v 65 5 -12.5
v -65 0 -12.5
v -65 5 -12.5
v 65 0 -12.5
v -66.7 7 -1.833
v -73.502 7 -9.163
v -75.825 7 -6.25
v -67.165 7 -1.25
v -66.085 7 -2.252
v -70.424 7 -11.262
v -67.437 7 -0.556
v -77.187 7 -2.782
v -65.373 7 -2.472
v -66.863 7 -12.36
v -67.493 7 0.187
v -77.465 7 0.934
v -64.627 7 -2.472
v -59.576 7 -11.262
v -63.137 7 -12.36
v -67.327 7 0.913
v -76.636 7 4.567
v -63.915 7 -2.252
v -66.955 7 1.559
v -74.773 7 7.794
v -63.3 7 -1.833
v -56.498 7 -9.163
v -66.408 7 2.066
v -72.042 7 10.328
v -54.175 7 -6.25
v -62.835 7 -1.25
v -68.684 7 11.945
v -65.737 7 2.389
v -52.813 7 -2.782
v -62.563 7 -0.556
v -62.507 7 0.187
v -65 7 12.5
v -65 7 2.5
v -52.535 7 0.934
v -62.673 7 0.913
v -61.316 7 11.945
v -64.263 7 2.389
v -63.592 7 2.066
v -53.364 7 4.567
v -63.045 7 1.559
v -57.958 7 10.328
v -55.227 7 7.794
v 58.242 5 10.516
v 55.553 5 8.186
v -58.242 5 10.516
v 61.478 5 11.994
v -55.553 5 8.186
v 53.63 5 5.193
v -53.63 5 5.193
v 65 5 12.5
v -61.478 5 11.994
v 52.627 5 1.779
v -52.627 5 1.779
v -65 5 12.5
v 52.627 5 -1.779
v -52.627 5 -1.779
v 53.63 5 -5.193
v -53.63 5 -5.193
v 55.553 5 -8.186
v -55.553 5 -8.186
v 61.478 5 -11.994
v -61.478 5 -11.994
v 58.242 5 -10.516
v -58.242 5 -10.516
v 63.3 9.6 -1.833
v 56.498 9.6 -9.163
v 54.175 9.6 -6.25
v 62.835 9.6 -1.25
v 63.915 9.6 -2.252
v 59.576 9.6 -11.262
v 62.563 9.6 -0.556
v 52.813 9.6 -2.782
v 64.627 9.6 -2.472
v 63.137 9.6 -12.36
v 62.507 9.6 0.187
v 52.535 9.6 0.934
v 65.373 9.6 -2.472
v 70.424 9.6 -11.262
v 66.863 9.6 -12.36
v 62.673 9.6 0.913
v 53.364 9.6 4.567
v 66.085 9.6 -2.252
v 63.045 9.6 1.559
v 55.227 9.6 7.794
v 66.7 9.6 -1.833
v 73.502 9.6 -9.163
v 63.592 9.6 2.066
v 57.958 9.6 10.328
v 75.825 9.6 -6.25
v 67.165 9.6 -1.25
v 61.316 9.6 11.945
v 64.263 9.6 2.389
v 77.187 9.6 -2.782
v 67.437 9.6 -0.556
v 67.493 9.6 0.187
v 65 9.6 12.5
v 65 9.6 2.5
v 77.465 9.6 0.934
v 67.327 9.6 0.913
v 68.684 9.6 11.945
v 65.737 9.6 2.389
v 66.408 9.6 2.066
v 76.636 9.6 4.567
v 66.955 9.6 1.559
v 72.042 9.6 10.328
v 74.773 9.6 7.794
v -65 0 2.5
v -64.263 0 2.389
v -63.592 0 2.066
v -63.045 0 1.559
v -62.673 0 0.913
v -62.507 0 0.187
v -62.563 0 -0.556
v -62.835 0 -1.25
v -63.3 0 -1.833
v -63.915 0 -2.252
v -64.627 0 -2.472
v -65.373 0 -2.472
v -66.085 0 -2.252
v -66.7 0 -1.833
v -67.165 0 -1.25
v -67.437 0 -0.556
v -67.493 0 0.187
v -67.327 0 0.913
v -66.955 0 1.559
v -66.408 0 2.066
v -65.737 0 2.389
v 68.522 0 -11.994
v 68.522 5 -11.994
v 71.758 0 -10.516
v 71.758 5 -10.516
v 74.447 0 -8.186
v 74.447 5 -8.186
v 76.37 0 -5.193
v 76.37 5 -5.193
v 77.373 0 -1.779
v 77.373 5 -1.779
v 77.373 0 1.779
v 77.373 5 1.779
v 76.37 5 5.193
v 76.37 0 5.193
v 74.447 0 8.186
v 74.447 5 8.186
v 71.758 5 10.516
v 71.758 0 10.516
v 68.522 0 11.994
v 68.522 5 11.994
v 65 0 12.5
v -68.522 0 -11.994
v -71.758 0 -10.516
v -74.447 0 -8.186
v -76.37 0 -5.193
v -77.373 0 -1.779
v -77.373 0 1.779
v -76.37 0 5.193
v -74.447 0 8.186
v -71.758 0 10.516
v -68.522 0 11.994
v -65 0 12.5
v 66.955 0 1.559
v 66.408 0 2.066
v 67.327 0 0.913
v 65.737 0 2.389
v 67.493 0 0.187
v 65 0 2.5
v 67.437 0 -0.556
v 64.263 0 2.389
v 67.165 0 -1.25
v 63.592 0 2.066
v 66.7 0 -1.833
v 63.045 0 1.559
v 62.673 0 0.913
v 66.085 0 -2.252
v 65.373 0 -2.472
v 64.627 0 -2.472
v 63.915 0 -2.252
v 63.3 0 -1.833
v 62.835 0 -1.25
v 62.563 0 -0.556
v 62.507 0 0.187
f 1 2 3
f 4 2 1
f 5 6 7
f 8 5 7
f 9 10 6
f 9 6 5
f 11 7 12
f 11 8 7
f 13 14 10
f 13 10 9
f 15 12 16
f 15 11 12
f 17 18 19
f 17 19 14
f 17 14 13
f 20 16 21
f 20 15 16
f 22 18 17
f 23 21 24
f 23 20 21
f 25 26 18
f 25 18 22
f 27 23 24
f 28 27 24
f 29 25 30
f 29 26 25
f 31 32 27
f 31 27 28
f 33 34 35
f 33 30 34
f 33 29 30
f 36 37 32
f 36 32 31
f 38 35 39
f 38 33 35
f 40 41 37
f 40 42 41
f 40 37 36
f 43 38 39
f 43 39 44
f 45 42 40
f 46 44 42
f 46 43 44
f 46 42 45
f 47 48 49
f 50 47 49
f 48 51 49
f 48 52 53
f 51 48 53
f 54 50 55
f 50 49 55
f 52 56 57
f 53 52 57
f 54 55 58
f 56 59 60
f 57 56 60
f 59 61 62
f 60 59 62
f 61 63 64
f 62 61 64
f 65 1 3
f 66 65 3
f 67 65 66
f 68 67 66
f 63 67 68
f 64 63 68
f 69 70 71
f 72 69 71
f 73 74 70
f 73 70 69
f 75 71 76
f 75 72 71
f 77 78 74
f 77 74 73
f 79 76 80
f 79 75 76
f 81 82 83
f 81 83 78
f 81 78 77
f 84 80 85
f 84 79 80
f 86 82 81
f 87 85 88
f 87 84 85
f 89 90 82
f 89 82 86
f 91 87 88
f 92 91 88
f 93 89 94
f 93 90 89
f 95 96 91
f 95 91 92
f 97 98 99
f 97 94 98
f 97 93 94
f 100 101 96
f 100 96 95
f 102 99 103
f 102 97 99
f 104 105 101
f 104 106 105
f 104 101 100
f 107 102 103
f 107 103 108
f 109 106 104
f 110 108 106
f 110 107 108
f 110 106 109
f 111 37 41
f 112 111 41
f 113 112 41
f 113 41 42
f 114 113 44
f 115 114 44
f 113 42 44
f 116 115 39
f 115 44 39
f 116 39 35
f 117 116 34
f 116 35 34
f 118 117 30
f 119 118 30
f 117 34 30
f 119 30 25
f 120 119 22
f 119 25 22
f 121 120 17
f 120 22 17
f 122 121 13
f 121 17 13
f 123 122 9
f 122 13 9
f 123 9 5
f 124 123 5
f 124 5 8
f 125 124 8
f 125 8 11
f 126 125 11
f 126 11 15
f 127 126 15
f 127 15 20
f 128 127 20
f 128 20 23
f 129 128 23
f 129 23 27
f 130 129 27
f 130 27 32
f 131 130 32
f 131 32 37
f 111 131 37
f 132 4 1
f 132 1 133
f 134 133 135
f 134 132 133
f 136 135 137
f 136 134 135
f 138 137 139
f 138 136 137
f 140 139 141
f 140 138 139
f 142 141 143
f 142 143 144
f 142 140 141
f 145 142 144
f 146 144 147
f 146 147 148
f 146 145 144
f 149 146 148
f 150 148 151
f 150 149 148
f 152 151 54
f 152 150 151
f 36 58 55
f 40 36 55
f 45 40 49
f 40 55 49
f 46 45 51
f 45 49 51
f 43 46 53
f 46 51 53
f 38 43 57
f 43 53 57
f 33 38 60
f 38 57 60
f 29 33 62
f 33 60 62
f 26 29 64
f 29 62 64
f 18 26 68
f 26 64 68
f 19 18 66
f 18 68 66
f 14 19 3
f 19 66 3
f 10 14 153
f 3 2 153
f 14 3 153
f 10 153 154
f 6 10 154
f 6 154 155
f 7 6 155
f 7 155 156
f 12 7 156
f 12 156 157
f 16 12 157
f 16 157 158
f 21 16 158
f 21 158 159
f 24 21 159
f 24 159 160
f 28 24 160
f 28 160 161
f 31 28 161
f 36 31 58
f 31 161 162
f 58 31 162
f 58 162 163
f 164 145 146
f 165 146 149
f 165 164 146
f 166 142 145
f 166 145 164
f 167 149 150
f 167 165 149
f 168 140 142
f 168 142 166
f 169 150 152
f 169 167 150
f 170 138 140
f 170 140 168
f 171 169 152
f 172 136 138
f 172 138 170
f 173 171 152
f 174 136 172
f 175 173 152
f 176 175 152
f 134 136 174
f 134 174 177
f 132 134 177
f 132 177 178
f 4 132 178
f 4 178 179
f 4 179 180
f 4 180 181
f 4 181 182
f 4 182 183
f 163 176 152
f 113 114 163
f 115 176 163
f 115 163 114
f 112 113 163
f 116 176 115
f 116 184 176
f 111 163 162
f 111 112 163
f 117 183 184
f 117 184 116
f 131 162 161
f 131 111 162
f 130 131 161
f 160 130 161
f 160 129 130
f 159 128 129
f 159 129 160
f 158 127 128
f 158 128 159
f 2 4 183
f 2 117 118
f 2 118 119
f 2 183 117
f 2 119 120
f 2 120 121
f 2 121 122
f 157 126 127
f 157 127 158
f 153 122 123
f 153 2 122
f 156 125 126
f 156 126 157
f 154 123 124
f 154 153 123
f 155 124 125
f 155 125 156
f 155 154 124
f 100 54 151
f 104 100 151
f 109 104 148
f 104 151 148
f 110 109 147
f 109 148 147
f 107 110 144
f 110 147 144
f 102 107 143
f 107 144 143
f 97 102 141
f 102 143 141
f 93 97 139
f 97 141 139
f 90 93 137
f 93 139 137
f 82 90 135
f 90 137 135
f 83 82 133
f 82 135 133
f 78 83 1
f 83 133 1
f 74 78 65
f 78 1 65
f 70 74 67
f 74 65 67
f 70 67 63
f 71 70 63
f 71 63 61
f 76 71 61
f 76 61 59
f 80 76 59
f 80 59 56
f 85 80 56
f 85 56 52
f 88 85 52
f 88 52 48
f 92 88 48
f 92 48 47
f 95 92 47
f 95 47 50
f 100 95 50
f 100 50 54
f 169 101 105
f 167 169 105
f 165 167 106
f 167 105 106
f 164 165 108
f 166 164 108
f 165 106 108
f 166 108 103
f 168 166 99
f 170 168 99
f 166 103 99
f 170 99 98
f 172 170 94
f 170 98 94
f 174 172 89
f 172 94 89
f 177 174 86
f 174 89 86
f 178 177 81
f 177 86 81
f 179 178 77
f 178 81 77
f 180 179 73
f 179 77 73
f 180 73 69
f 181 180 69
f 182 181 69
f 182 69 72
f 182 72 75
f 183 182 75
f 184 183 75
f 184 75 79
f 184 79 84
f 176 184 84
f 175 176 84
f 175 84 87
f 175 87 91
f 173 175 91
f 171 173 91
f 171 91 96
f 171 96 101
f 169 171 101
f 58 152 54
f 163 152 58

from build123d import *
from build123d.topology import SkipClean

# Parameters (mm, degrees)
EXTRUDE_1_DEPTH     = 5
SKETCH_5_R          = 12.5
EXTRUDE_2_DEPTH     = 2
CUT_EXTRUDE_1_REACH = 80.813
SKETCH_6_R          = 2.5
SKETCH_8_R          = 12.5
EXTRUDE_3_DEPTH     = 4.6
CUT_EXTRUDE_2_REACH = 81.086
SKETCH_7_R          = 2.5


with BuildPart() as part:
    # 草图1 → 凸台-拉伸1 (new body)
    with BuildSketch(Plane(origin=(0, 0, 0), x_dir=(1, 0, 0), z_dir=(0, 1, 0))):
        with BuildLine():
            Line((-65, 12.5), (65, 12.5))
            ThreePointArc((65, 12.5), (77.5, 0), (65, -12.5))
            Line((65, -12.5), (-65, -12.5))
            ThreePointArc((-65, -12.5), (-77.5, 0), (-65, 12.5))
        make_face()
    extrude(amount=EXTRUDE_1_DEPTH)

    # 草图5 → 凸台-拉伸2 (add)
    with BuildSketch(Plane(origin=(0, 5, 0), x_dir=(1, 0, 0), z_dir=(0, 1, 0))):
        with Locations((-65, 0)):
            Circle(SKETCH_5_R)
    extrude(amount=EXTRUDE_2_DEPTH)

    # 草图6 → 切除-拉伸1 (cut, up to next)
    with BuildSketch(Plane(origin=(0, 7, 0), x_dir=(1, 0, 0), z_dir=(0, 1, 0)), mode=Mode.PRIVATE) as cut_extrude_1_sk1:
        with Locations((-65, 0)):
            Circle(SKETCH_6_R)
    cut_extrude_1_tool1 = extrude(cut_extrude_1_sk1.sketch, amount=-CUT_EXTRUDE_1_REACH, mode=Mode.PRIVATE) & part.part
    add(cut_extrude_1_tool1.solids().sort_by_distance((-65, 7, 0))[0], mode=Mode.SUBTRACT)

    # 草图8 → 凸台-拉伸3 (add)
    with SkipClean():  # the faces are left unmerged after this step: merging them gives an invalid solid
        with BuildSketch(Plane(origin=(0, 5, 0), x_dir=(1, 0, 0), z_dir=(0, 1, 0))):
            with Locations((65, 0)):
                Circle(SKETCH_8_R)
        extrude(amount=EXTRUDE_3_DEPTH)
    add(part.part.scale(1), mode=Mode.REPLACE)  # the faces are merged on a copy

    # 草图7 → 切除-拉伸2 (cut, up to next)
    with BuildSketch(Plane(origin=(0, 9.6, 0), x_dir=(1, 0, 0), z_dir=(0, 1, 0)), mode=Mode.PRIVATE) as cut_extrude_2_sk1:
        with Locations((65, 0)):
            Circle(SKETCH_7_R)
    cut_extrude_2_tool1 = extrude(cut_extrude_2_sk1.sketch, amount=-CUT_EXTRUDE_2_REACH, mode=Mode.PRIVATE) & part.part
    add(cut_extrude_2_tool1.solids().sort_by_distance((65, 9.6, 0))[0], mode=Mode.SUBTRACT)


solid = part.part
